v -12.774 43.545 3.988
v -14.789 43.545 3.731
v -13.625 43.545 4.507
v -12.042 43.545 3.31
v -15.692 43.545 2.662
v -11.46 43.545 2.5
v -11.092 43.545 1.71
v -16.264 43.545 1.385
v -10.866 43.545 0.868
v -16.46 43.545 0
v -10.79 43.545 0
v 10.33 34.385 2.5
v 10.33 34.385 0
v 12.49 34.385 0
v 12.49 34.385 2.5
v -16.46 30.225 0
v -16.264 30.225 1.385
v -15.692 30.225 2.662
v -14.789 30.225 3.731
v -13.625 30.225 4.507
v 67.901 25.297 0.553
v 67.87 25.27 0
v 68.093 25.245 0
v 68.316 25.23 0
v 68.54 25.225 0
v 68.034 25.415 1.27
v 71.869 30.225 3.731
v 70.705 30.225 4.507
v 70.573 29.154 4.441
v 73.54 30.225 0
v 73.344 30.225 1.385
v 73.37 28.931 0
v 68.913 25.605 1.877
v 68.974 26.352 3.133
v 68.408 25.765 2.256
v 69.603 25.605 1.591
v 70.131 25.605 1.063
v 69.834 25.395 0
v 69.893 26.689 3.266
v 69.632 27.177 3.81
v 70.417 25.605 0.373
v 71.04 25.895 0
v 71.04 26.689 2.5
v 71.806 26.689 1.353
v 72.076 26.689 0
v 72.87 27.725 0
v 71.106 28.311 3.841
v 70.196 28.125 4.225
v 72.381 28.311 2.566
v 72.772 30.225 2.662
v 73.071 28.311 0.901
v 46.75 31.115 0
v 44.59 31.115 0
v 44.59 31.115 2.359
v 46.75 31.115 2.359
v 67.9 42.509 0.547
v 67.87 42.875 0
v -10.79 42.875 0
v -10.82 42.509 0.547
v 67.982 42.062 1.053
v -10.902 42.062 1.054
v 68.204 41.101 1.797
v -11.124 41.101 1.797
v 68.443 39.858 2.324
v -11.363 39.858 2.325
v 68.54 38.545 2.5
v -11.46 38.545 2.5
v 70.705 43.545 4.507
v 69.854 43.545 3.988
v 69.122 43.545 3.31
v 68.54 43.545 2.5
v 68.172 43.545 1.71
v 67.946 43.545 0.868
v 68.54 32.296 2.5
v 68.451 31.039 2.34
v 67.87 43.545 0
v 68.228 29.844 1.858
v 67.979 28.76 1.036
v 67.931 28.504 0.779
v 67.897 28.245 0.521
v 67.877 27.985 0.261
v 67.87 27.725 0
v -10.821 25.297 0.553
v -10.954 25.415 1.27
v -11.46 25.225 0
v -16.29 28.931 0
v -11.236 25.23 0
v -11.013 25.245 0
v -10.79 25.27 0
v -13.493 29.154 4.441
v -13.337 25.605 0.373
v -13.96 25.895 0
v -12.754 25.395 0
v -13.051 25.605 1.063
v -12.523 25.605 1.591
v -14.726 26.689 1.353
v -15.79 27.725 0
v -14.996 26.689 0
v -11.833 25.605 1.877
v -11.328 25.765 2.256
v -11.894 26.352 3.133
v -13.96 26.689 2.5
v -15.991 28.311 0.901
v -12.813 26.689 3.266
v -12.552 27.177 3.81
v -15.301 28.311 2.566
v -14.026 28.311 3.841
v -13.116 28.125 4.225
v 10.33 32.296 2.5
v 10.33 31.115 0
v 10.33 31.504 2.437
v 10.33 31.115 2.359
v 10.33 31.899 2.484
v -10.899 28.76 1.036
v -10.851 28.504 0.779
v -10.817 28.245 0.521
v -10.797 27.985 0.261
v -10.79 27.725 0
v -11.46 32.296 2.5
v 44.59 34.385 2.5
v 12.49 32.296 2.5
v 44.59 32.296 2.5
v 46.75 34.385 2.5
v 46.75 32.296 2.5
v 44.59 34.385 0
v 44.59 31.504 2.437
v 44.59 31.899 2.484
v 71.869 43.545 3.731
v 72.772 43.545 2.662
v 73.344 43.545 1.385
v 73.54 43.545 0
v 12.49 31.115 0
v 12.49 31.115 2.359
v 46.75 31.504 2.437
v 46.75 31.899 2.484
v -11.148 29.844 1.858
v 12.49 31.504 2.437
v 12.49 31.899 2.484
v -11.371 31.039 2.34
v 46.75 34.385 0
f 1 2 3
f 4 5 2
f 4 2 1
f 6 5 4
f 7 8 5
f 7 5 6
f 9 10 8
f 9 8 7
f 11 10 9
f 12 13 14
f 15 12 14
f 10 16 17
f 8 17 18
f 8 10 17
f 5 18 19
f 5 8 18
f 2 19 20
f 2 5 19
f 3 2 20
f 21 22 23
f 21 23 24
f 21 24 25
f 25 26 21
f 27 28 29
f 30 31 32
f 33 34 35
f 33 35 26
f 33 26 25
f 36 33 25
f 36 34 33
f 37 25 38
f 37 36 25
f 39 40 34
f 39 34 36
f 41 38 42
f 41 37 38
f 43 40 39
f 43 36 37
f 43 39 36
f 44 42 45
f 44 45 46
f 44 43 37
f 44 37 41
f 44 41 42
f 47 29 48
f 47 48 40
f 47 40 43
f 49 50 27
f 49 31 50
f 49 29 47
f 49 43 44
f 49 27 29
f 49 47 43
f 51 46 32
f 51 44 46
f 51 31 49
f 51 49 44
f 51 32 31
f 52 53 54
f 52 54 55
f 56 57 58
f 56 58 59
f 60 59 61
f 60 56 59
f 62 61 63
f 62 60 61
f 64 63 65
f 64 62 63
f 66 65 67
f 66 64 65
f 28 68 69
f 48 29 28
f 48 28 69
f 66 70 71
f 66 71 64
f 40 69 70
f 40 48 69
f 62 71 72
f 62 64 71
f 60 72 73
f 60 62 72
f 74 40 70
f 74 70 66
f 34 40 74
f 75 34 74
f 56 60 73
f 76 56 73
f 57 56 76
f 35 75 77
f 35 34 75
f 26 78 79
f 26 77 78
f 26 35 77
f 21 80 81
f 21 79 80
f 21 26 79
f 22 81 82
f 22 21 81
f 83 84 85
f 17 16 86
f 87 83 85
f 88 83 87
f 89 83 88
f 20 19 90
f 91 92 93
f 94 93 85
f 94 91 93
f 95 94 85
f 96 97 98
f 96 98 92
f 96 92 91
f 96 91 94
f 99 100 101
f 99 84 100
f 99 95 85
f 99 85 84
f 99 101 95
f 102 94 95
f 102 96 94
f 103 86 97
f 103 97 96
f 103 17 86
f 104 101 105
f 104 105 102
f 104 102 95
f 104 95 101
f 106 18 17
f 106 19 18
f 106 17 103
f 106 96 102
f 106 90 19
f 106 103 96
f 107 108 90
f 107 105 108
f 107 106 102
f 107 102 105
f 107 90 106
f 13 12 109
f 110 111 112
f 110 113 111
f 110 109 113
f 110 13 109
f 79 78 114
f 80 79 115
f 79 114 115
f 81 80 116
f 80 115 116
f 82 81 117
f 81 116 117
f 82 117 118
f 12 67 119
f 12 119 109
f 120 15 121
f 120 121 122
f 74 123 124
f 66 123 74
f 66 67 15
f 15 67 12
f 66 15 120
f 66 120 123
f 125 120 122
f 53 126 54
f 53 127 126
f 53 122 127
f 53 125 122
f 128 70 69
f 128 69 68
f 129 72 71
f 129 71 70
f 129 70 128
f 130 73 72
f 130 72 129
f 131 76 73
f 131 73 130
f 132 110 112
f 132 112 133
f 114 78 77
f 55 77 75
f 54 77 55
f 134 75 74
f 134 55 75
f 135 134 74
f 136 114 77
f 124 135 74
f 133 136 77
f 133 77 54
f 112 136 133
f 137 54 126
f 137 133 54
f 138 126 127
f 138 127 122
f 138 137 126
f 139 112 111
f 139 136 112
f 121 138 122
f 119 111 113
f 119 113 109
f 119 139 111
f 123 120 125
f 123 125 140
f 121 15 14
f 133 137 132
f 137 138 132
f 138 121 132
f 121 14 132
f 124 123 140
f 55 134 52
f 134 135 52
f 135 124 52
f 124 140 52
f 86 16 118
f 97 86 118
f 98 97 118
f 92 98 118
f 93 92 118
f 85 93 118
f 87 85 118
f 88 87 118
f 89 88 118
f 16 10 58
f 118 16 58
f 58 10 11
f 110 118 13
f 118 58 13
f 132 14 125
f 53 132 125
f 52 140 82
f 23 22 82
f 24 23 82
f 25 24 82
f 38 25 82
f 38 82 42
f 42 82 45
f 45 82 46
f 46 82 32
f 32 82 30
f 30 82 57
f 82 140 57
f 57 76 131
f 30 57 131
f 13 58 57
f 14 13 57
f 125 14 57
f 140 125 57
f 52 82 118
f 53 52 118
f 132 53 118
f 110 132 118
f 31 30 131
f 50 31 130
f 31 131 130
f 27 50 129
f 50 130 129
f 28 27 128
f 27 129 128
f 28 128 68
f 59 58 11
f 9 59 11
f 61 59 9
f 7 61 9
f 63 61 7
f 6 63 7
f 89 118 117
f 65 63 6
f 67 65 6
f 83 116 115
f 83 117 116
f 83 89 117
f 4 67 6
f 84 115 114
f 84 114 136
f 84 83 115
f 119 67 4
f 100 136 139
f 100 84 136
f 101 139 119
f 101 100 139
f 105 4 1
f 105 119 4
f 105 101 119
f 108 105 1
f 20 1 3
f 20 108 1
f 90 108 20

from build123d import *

# Parameters (mm, degrees)
F0_W          = 90
F0_H          = 18.32
F1_DEPTH      = 2.5
F2_W          = 2.16
F2_H          = 3.27
F3_DEPTH      = 25
F4_W          = 5
F4_H          = 18.32
F5_DEPTH      = 2.5
F6_T1_DEPTH   = 43.32
F6_T3_DEPTH   = 39.9706350946
F7_T1_DEPTH   = 39.9706350946
F7_T3_DEPTH   = 43.32
F8_T4_DEPTH   = 105.7168298797
F8_S5_R       = 5.0000000001
F8_T6_DEPTH   = 54
F8_S7_R       = 5.0000000001
F8_T8_DEPTH   = 54
F9_T4_DEPTH   = 105
F9_S5_R       = 5.0000000001
F9_T6_DEPTH   = 54
F9_S7_R       = 5.0000000001
F9_T8_DEPTH   = 54
F10_T4_ANGLE  = 350.8787991533
F10_S5_R      = 5.0000000001
F10_T6_DEPTH  = 9
F10_T10_ANGLE = 350.8787991654
F10_S11_R     = 5.0000000001
F10_T12_DEPTH = 9
F11_T4_DEPTH  = 90.3553390593
F11_S5_R      = 5.0000000001
F11_T6_DEPTH  = 47
F11_S7_R      = 5.0000000001
F11_T8_DEPTH  = 47


# Not quite as in the source:
# - a fillet or chamfer that OpenCascade refuses, or shapes differently, is made with other operations: its cross-section is extruded or revolved along the edge and cut away or added


with BuildPart() as f1:
    # F0 (on Top) → F1 (new body)
    with BuildSketch(Plane.XY):
        with Locations((28.5399998152, 34.3848172414)):
            Rectangle(F0_W, F0_H)
    extrude(amount=F1_DEPTH)

    # F2 (on face) → F3 (cut)
    with BuildSketch(Plane(origin=(0, 0, 0), x_dir=(1, 0, 0), z_dir=(0, 0, -1))):
        with Locations((11.4099998152, -32.7498172414)):
            Rectangle(F2_W, F2_H)
        with Locations((45.6699998152, -32.7498172414)):
            Rectangle(F2_W, F2_H)
    extrude(amount=-F3_DEPTH, mode=Mode.SUBTRACT)

    # F4 (on face) → F5 (join)
    with BuildSketch(Plane.XY.offset(2.5)):
        with Locations((-13.9600001848, 34.3848172414)):
            Rectangle(F4_W, F4_H)
        with Locations((71.0399998152, 34.3848172414)):
            Rectangle(F4_W, F4_H)
    extrude(amount=F5_DEPTH)

    # F6: fillet of radius 5 on 2 edges, made by hand

    # F6_s2 → F6_t1 (cut)
    with BuildSketch(Plane.XZ.offset(-56.0448172414)):
        with BuildLine():
            ThreePointArc((-16.4600001848, 0), (-14.9955340907, 3.5355339059), (-11.4600001848, 5))
            Line((-11.4600001848, 5), (-16.4600001848, 5))
            Line((-16.4600001848, 5), (-16.4600001848, 0))
        make_face()
    extrude(amount=F6_T1_DEPTH, mode=Mode.SUBTRACT)

    # F6_s4 → F6_t3 (cut)
    with BuildSketch(Plane.XZ.offset(-54.3701347887)):
        with BuildLine():
            ThreePointArc((-15.7901272037, 5), (-13.2901272037, 4.3301270189), (-11.4600001848, 2.5))
            Line((-11.4600001848, 2.5), (-11.4600001848, 5))
            Line((-11.4600001848, 5), (-15.7901272037, 5))
        make_face()
    extrude(amount=F6_T3_DEPTH, mode=Mode.SUBTRACT)

    # F7: fillet of radius 5 on 2 edges, made by hand

    # F7_s2 → F7_t1 (cut)
    with BuildSketch(Plane.XZ.offset(-54.3701347887)):
        with BuildLine():
            ThreePointArc((68.5399998152, 2.5), (70.3701268341, 4.3301270189), (72.8701268341, 5))
            Line((72.8701268341, 5), (68.5399998152, 5))
            Line((68.5399998152, 5), (68.5399998152, 2.5))
        make_face()
    extrude(amount=F7_T1_DEPTH, mode=Mode.SUBTRACT)

    # F7_s4 → F7_t3 (cut)
    with BuildSketch(Plane.XZ.offset(-56.0448172414)):
        with BuildLine():
            ThreePointArc((73.5399998152, 0), (72.0755337212, 3.5355339059), (68.5399998152, 5))
            Line((68.5399998152, 5), (73.5399998152, 5))
            Line((73.5399998152, 5), (73.5399998152, 0))
        make_face()
    extrude(amount=F7_T3_DEPTH, mode=Mode.SUBTRACT)

    # F8: chamfer of 5 on 1 edges, made by hand


with BuildPart() as f8_tool2:
    # F8_s3 → F8_t4 (new body)
    with BuildSketch(Plane.YZ.offset(-24.3184151246)):
        Polygon((30.2248172414, 2.5), (25.2248172414, -2.5), (25.2248172414, 2.5), align=None)
    extrude(amount=F8_T4_DEPTH)

    # F8_s5 → F8_t6 (cut, symmetric)
    with BuildSketch(Plane.XZ.offset(-27.7)):
        with Locations((-15.7901272038, -1e-10)):
            Circle(F8_S5_R)
    extrude(amount=F8_T6_DEPTH, both=True, mode=Mode.SUBTRACT)

    # F8_s7 → F8_t8 (cut, symmetric)
    with BuildSketch(Plane.XZ.offset(-27.7)):
        with Locations((72.8701268342, -1e-10)):
            Circle(F8_S7_R)
    extrude(amount=F8_T8_DEPTH, both=True, mode=Mode.SUBTRACT)


with BuildPart() as f1_1:
    add(f1.part)

    # F8_t1: cut F8_tool2
    add(f8_tool2.part, mode=Mode.SUBTRACT)

    # F9: fillet of radius 5 on 1 edges, made by hand


with BuildPart() as f9_tool2:
    # F9_s3 → F9_t4 (new body)
    with BuildSketch(Plane.YZ.offset(81.0399998152)):
        with BuildLine():
            ThreePointArc((43.5448172414, -2.5), (42.0803511473, 1.0355339059), (38.5448172414, 2.5))
            Line((38.5448172414, 2.5), (43.5448172414, 2.5))
            Line((43.5448172414, 2.5), (43.5448172414, -2.5))
        make_face()
    extrude(amount=-F9_T4_DEPTH)

    # F9_s5 → F9_t6 (cut, symmetric)
    with BuildSketch(Plane.XZ.offset(-41)):
        with Locations((72.8701268342, -1e-10)):
            Circle(F9_S5_R)
    extrude(amount=F9_T6_DEPTH, both=True, mode=Mode.SUBTRACT)

    # F9_s7 → F9_t8 (cut, symmetric)
    with BuildSketch(Plane.XZ.offset(-41)):
        with Locations((-15.7901272038, -1e-10)):
            Circle(F9_S7_R)
    extrude(amount=F9_T8_DEPTH, both=True, mode=Mode.SUBTRACT)


with BuildPart() as f1_2:
    add(f1_1.part)

    # F9_t1: cut F9_tool2
    add(f9_tool2.part, mode=Mode.SUBTRACT)

    # F10: fillet of radius 5 on 2 edges, made by hand


with BuildPart() as f10_tool2:
    # F10_s3 → F10_t4 (revolve)
    with BuildSketch(Plane(origin=(-4.0989769567, 0, -5.492965009), x_dir=(0, 1, 0), z_dir=(0.5980609221, 0, 0.8014506432))):
        with BuildLine():
            ThreePointArc((25.2248172414, 9.1846245187), (26.6892833355, 5.6490906128), (30.2248172414, 4.1846245187))
            Line((30.2248172414, 4.1846245187), (25.2248172414, 4.1846245187))
            Line((25.2248172414, 4.1846245187), (25.2248172414, 9.1846245187))
        make_face()
    revolve(axis=Axis((-11.4600001847, 25.2248172414, -1e-10), (0, 1, 0)), revolution_arc=F10_T4_ANGLE)

    # F10_s5 → F10_t6 (intersect, symmetric)
    with BuildSketch(Plane.XZ.offset(-27.7)):
        with Locations((-15.7901272038, -1e-10)):
            Circle(F10_S5_R)
    extrude(amount=F10_T6_DEPTH, both=True, mode=Mode.INTERSECT)


with BuildPart() as f1_3:
    add(f1_2.part)

    # F10_t1: cut F10_tool2
    add(f10_tool2.part, mode=Mode.SUBTRACT)


with BuildPart() as f10_tool8:
    # F10_s9 → F10_t10 (revolve)
    with BuildSketch(Plane(origin=(14.7214175546, 0, -28.147572216), x_dir=(0, 1, 0), z_dir=(0.4634498715, 0, -0.8861231385))):
        with BuildLine():
            ThreePointArc((25.2248172414, 60.7348797497), (26.6892833355, 57.1993458438), (30.2248172414, 55.7348797497))
            Line((30.2248172414, 55.7348797497), (25.2248172414, 55.7348797497))
            Line((25.2248172414, 55.7348797497), (25.2248172414, 60.7348797497))
        make_face()
    revolve(axis=Axis((68.5399998153, 25.2248172414, 1e-10), (0, 1, 0)), revolution_arc=F10_T10_ANGLE)

    # F10_s11 → F10_t12 (intersect, symmetric)
    with BuildSketch(Plane.XZ.offset(-27.7)):
        with Locations((72.8701268342, -1e-10)):
            Circle(F10_S11_R)
    extrude(amount=F10_T12_DEPTH, both=True, mode=Mode.INTERSECT)


with BuildPart() as f1_4:
    add(f1_3.part)

    # F10_t7: cut F10_tool8
    add(f10_tool8.part, mode=Mode.SUBTRACT)

    # F11: fillet of radius 5 on 1 edges, made by hand


with BuildPart() as f11_tool2:
    # F11_s3 → F11_t4 (new body)
    with BuildSketch(Plane.YZ.offset(-16.6376697145)):
        with BuildLine():
            ThreePointArc((28.7603511473, 1.0355339059), (30.3824678914, 2.1193976626), (32.2958850533, 2.5))
            Line((32.2958850533, 2.5), (30.2248172414, 2.5))
            Line((30.2248172414, 2.5), (28.7603511473, 1.0355339059))
        make_face()
    extrude(amount=F11_T4_DEPTH)

    # F11_s5 → F11_t6 (cut, symmetric)
    with BuildSketch(Plane.XZ.offset(-30.5)):
        with Locations((72.8701268342, -1e-10)):
            Circle(F11_S5_R)
    extrude(amount=F11_T6_DEPTH, both=True, mode=Mode.SUBTRACT)

    # F11_s7 → F11_t8 (cut, symmetric)
    with BuildSketch(Plane.XZ.offset(-30.5)):
        with Locations((-15.7901272038, -1e-10)):
            Circle(F11_S7_R)
    extrude(amount=F11_T8_DEPTH, both=True, mode=Mode.SUBTRACT)


with BuildPart() as f1_5:
    add(f1_4.part)

    # F11_t1: cut F11_tool2
    add(f11_tool2.part, mode=Mode.SUBTRACT)


solid = f1_5.part
